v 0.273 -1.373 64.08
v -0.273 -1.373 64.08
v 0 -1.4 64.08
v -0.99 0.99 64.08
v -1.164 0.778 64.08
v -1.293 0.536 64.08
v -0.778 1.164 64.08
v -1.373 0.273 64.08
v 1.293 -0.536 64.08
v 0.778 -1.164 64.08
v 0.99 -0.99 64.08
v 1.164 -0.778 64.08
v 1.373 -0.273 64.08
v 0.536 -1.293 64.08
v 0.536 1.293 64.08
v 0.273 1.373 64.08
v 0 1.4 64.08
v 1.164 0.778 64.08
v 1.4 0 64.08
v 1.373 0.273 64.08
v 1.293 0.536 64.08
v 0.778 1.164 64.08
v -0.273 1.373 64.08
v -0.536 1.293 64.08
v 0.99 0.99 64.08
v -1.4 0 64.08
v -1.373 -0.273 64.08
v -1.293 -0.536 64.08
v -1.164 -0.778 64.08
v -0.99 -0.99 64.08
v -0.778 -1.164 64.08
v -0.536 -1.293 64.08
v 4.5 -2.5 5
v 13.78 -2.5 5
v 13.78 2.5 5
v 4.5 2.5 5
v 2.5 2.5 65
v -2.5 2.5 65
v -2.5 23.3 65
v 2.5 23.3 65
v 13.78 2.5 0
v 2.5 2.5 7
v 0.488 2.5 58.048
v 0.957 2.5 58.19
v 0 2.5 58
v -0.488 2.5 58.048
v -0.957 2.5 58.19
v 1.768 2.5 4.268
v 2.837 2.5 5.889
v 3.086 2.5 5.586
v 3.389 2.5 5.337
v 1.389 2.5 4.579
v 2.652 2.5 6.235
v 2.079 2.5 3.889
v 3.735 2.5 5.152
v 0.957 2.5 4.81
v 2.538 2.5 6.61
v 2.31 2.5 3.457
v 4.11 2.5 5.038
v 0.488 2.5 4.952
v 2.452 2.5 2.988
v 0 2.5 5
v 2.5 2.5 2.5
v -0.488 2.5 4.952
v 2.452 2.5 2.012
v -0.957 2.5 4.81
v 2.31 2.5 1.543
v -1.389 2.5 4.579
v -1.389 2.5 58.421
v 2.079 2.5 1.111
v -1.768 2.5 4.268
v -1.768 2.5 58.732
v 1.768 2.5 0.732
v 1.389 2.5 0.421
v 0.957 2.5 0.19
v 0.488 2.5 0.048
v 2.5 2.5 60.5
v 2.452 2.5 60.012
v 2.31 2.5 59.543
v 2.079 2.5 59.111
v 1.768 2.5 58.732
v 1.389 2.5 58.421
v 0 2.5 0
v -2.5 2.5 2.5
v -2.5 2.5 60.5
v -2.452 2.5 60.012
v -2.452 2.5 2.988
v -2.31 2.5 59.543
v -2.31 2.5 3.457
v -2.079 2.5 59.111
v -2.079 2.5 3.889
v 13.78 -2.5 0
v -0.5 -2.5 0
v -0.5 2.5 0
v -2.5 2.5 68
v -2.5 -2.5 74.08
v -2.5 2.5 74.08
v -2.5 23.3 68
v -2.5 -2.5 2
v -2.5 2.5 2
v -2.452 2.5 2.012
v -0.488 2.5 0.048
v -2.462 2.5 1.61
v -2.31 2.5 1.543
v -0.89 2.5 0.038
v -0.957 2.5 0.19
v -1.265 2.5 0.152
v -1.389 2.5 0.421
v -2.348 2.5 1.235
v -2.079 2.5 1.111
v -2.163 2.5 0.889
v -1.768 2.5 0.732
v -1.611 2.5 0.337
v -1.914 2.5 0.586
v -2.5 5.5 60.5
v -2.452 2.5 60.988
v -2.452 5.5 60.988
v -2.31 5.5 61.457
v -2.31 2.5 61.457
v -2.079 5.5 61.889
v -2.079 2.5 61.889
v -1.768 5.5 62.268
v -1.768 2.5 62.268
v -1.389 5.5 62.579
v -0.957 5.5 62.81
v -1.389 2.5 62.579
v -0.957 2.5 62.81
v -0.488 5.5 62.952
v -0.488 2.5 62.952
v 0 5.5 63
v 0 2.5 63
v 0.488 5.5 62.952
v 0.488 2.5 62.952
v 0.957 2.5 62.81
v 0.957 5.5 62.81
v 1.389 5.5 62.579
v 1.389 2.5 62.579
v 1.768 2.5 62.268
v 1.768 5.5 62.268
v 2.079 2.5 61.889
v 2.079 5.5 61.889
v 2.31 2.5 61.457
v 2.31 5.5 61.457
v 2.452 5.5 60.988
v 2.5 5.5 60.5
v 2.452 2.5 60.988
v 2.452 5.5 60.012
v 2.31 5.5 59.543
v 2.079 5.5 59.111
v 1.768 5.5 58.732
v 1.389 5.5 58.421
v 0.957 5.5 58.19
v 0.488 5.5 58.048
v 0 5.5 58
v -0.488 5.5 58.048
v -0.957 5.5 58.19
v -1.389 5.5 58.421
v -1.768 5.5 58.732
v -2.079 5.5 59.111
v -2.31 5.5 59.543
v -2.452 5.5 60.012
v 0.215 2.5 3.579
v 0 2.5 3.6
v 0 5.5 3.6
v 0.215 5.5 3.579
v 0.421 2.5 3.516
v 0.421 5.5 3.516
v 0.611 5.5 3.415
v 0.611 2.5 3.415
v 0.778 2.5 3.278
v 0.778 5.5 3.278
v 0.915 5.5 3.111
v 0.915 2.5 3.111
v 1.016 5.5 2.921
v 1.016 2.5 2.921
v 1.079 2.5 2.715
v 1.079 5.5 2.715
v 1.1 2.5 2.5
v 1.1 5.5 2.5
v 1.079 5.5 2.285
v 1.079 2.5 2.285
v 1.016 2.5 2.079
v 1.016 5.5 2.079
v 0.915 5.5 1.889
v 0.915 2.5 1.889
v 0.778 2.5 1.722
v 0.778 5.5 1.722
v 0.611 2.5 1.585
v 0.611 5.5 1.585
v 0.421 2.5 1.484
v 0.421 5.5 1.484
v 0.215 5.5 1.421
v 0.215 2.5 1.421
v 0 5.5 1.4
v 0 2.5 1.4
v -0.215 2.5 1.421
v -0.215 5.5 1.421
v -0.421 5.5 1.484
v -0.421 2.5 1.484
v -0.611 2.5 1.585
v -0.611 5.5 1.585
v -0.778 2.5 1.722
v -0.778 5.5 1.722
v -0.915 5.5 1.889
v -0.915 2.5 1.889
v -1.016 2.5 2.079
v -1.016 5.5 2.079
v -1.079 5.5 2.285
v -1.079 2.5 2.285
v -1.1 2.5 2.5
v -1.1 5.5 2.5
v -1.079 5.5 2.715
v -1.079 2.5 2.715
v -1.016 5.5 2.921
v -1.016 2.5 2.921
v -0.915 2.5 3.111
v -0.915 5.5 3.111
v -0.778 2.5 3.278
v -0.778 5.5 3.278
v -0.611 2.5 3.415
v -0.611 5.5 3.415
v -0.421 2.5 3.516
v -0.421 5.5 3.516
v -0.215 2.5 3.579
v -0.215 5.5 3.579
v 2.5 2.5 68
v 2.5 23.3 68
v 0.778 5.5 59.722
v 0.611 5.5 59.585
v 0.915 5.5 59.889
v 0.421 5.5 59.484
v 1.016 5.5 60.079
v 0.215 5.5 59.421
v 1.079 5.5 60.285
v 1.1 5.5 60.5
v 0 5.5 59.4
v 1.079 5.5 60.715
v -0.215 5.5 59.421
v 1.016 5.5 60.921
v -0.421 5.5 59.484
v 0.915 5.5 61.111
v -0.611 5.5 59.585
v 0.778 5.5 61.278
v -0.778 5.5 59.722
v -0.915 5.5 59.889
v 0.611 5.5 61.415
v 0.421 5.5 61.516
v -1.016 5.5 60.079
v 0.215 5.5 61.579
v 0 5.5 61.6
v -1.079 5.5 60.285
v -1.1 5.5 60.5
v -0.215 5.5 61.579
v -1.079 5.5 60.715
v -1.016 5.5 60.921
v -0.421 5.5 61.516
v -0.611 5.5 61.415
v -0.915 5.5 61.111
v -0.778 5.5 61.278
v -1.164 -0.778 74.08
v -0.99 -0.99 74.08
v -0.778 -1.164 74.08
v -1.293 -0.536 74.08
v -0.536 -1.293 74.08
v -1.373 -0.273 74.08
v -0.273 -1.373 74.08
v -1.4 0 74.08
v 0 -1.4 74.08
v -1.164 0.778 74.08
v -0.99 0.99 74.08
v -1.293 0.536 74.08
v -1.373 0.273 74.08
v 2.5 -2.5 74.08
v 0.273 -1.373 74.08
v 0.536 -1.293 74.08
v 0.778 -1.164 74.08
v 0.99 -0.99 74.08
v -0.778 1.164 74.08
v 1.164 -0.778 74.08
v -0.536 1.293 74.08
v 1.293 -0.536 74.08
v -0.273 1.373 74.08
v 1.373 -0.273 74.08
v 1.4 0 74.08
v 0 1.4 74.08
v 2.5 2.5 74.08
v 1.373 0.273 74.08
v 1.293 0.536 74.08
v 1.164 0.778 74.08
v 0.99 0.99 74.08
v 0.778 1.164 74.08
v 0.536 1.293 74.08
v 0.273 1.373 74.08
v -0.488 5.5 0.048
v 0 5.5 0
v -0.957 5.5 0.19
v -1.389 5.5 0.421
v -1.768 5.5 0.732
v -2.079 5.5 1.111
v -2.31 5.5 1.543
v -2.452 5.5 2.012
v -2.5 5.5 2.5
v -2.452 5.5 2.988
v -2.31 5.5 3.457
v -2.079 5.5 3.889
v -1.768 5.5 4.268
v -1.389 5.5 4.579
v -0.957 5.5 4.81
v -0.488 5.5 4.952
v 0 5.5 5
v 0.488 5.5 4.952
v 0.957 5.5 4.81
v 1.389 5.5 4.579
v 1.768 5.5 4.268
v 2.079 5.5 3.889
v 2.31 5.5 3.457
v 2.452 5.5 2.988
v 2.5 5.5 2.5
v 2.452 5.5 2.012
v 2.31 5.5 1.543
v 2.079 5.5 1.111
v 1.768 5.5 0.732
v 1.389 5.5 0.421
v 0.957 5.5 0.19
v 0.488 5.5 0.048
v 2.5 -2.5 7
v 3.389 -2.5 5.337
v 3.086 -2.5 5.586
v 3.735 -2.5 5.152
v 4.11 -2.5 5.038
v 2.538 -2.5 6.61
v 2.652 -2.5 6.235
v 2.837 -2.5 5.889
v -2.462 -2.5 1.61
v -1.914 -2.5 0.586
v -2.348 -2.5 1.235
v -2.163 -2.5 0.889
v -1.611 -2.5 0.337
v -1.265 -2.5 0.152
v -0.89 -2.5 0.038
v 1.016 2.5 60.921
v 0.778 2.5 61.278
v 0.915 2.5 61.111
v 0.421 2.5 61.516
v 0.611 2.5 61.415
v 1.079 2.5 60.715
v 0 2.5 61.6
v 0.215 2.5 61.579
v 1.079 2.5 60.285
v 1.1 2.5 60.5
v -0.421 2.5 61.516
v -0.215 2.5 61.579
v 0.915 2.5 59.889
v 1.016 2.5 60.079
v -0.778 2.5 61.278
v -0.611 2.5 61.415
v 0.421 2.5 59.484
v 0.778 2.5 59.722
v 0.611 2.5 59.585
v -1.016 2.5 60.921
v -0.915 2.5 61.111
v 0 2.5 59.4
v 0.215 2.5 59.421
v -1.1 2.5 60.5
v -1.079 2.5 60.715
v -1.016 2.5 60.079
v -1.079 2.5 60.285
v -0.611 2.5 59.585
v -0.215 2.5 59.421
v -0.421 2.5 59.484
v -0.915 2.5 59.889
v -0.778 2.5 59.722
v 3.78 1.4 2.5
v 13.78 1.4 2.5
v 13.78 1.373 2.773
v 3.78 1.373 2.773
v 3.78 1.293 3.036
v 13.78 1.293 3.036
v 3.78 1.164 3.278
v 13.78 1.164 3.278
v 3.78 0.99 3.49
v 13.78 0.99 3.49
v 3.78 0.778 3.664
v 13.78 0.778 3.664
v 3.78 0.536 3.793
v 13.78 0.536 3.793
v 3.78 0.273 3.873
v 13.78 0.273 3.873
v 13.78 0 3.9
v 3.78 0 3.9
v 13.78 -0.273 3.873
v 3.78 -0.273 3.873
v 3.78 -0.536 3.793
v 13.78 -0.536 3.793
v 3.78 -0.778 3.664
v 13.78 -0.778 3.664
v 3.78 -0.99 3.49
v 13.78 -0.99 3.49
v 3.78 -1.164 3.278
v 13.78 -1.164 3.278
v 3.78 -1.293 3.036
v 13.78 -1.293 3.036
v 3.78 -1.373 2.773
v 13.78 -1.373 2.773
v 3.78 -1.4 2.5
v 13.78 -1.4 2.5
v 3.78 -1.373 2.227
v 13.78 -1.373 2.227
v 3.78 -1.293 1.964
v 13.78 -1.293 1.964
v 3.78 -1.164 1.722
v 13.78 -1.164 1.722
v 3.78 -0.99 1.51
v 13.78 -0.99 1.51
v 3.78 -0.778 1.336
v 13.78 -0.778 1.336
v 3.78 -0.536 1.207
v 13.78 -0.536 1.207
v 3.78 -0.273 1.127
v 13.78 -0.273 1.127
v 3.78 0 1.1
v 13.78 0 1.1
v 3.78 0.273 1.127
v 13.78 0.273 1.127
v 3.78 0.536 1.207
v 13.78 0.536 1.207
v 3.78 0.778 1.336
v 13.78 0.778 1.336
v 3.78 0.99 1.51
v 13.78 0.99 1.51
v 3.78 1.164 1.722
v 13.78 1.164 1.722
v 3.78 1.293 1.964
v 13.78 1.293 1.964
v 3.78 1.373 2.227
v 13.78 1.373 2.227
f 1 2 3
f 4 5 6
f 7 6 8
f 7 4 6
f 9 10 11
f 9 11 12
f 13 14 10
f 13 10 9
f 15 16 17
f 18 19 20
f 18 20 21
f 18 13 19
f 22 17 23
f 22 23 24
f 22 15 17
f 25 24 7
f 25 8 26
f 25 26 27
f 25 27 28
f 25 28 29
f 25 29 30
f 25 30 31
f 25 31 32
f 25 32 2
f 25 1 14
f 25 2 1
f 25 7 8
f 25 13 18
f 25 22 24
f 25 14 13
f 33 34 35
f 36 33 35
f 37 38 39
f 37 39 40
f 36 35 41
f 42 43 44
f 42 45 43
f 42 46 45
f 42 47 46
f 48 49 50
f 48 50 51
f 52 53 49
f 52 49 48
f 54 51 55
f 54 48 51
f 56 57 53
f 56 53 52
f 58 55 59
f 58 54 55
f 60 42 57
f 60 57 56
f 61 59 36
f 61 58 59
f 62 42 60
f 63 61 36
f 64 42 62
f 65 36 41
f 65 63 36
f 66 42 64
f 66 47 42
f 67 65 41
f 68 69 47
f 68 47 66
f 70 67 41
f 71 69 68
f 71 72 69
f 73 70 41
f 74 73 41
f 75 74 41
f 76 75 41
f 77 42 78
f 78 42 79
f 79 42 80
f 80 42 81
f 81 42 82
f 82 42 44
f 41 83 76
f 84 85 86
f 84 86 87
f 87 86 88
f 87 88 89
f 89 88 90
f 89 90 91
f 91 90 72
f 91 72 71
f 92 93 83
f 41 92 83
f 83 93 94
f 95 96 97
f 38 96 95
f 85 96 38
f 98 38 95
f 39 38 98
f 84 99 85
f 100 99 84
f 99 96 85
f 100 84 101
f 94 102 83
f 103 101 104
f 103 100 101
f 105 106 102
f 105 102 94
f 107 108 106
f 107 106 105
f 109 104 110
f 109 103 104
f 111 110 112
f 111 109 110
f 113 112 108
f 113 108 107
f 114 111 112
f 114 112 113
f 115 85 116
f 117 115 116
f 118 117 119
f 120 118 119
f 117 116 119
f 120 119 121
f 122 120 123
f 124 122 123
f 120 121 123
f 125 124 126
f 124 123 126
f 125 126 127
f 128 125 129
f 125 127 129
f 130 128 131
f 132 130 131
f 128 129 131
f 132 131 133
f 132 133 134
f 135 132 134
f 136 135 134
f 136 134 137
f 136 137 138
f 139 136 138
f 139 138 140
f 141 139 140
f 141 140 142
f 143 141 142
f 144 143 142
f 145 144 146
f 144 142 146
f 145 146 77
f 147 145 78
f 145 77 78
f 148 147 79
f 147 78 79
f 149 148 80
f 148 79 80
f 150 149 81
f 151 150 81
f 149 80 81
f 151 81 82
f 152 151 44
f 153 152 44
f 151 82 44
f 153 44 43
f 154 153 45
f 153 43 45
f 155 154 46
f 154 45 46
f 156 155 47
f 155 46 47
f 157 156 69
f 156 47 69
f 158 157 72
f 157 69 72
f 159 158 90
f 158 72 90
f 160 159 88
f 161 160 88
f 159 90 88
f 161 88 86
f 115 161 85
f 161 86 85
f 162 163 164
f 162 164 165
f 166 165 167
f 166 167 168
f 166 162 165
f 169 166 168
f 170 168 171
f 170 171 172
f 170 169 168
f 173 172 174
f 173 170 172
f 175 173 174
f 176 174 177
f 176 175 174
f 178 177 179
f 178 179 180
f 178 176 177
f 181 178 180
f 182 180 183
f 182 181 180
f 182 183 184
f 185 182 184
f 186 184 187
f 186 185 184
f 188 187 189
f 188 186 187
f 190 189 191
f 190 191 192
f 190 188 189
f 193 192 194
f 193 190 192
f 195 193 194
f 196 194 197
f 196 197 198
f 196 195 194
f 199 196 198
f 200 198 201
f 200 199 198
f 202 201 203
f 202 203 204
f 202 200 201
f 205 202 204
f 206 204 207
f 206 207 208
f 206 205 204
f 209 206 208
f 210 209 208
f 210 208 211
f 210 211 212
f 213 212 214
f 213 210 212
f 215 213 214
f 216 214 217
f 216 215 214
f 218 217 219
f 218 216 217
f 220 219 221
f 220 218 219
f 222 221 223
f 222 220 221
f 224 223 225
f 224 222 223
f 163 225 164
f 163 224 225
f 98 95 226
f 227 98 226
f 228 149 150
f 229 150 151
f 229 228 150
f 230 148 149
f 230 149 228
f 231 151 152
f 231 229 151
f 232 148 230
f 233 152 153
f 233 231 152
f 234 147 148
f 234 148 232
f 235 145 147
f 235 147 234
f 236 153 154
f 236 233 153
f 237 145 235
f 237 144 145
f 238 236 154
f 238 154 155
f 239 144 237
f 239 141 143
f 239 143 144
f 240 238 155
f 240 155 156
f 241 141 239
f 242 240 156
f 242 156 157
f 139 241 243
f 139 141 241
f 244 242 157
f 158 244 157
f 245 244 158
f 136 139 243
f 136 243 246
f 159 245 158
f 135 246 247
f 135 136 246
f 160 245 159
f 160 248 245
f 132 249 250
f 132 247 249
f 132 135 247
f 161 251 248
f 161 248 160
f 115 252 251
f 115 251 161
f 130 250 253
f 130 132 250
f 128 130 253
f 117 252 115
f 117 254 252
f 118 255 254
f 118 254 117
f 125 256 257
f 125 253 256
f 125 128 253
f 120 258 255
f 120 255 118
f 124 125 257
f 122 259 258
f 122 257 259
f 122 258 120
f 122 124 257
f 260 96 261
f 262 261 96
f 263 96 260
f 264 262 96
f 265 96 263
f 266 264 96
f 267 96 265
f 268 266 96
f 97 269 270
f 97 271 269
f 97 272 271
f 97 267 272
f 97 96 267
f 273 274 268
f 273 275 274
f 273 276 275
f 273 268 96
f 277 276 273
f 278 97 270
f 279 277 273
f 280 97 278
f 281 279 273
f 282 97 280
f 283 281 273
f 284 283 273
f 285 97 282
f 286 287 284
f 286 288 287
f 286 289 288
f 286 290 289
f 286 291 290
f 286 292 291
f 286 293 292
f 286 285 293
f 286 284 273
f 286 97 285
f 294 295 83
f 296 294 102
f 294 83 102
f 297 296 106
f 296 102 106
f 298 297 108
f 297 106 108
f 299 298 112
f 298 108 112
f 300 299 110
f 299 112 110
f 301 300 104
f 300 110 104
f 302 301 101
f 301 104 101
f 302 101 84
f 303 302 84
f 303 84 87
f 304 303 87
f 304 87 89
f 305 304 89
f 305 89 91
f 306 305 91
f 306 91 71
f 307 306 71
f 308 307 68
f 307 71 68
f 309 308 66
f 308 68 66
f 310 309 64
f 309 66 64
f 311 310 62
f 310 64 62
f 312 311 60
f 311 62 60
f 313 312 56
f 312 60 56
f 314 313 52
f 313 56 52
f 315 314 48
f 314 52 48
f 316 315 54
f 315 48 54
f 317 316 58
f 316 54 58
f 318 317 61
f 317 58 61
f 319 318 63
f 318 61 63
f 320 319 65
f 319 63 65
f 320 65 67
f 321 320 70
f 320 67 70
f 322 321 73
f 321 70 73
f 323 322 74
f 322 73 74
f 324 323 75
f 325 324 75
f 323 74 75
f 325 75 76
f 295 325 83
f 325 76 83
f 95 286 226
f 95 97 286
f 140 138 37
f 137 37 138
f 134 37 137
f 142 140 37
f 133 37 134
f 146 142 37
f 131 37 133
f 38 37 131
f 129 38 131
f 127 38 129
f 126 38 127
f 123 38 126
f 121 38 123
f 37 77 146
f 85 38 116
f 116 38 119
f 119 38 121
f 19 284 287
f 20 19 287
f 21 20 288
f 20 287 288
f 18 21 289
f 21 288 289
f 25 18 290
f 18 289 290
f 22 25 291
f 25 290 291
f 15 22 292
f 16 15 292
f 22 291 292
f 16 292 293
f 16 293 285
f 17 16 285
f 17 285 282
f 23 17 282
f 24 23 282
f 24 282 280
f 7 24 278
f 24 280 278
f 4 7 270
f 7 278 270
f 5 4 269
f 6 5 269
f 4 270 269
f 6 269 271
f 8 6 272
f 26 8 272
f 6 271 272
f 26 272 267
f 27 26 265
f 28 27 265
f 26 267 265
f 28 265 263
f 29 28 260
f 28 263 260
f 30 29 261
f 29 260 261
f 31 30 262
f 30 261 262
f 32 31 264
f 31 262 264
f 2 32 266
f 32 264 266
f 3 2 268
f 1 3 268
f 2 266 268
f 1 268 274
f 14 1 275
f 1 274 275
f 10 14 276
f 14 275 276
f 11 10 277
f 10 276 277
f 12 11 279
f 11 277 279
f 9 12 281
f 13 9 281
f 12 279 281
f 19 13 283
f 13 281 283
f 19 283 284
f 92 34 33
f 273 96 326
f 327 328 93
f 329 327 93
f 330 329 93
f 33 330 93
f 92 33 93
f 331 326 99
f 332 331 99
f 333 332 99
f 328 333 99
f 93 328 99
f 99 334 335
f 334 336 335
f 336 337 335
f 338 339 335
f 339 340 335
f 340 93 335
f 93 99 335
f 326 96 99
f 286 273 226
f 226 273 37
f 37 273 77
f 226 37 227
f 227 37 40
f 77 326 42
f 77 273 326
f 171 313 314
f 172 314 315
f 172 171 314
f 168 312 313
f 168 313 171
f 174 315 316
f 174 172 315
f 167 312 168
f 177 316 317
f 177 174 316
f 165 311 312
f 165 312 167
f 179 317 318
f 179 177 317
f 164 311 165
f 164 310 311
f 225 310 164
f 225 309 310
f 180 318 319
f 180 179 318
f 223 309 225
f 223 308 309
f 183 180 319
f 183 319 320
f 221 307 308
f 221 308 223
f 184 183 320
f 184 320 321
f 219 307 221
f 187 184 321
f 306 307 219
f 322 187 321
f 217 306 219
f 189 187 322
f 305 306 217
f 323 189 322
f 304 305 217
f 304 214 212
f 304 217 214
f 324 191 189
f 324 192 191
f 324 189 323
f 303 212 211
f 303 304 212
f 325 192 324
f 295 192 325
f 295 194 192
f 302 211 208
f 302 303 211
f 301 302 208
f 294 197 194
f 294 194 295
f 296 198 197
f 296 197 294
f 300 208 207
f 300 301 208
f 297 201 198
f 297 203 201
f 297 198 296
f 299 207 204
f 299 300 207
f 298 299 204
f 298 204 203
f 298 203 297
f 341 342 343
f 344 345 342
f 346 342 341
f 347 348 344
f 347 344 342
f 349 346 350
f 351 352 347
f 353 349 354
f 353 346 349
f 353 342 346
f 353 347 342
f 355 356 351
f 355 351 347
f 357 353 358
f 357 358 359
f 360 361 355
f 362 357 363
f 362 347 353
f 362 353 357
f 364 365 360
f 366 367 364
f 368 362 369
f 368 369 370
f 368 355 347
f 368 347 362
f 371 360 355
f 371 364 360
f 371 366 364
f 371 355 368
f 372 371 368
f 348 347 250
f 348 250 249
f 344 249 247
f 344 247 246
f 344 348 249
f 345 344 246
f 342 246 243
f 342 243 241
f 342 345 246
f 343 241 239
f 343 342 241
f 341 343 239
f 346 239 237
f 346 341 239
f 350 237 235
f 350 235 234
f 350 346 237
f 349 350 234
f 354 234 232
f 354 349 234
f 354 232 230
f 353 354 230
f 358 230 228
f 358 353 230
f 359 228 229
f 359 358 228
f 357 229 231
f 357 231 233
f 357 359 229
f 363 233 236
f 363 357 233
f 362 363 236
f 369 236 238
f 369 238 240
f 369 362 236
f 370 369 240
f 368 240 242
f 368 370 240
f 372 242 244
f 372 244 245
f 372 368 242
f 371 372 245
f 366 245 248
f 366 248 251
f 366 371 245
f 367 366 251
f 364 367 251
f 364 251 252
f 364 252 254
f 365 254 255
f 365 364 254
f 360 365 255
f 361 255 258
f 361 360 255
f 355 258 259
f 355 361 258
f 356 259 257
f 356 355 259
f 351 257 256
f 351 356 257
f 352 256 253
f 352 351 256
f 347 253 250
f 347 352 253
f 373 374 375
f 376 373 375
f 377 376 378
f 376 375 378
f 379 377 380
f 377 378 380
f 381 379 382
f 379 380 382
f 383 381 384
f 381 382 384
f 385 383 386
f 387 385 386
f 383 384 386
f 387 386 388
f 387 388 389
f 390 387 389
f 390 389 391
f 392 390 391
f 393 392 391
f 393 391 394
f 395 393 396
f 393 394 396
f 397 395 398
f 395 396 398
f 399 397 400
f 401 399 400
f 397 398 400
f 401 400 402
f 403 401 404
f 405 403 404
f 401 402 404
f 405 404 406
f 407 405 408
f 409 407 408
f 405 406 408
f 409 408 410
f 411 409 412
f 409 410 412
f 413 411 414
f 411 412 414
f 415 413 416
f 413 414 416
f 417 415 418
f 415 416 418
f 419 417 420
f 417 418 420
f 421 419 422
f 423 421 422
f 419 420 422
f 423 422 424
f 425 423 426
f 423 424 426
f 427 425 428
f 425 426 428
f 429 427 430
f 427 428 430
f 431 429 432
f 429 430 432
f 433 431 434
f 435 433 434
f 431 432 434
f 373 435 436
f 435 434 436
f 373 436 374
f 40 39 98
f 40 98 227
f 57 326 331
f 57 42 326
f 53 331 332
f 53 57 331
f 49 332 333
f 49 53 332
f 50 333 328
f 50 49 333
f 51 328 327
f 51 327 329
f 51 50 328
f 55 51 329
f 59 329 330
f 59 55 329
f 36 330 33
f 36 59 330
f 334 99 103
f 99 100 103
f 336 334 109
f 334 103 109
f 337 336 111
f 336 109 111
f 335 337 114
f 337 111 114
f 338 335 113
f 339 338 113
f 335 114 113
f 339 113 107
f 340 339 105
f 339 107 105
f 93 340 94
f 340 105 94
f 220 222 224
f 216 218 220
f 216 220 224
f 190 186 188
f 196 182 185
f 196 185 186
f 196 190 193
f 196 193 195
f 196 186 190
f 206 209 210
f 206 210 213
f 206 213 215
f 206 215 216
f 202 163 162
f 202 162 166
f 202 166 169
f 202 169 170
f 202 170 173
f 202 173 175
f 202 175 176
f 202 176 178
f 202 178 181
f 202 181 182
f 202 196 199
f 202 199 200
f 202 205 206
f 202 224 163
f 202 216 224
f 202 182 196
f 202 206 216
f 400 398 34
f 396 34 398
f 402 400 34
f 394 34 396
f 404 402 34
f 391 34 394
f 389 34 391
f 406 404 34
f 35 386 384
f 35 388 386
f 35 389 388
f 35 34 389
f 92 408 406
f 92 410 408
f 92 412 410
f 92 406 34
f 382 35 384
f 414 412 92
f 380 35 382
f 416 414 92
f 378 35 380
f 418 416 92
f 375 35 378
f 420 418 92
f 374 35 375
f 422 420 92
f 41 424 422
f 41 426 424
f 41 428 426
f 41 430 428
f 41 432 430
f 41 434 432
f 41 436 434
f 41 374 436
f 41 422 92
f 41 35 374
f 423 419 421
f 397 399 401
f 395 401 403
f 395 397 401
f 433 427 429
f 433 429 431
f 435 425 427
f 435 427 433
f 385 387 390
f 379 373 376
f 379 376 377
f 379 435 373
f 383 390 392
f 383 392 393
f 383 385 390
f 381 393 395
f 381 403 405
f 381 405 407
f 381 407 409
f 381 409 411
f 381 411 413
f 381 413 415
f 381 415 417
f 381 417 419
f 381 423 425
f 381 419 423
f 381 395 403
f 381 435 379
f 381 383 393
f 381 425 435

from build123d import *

# Parameters (mm, degrees)
SKETCH1_W           = 5
SKETCH1_H           = 5
BOSS_EXTRUDE1_DEPTH = 74.08
SKETCH2_R           = 1.4
CUT_EXTRUDE1_DEPTH  = 10
SKETCH3_W           = 5
SKETCH3_H           = 5
BOSS_EXTRUDE2_DEPTH = 11.28
SKETCH4_R           = 1.4
CUT_EXTRUDE2_DEPTH  = 10
SKETCH5_R           = 2.5
SKETCH5_R_2         = 1.1
BOSS_EXTRUDE3_DEPTH = 3
FILLET1_R           = 2
SKETCH7_W           = 5
SKETCH7_H           = 3
BOSS_EXTRUDE4_DEPTH = 20.8


with BuildPart() as part:
    # Sketch1 → Boss-Extrude1 (new body)
    with BuildSketch(Plane.XY):
        Rectangle(SKETCH1_W, SKETCH1_H)
    extrude(amount=BOSS_EXTRUDE1_DEPTH)

    # Sketch2 → Cut-Extrude1 (cut)
    with BuildSketch(Plane.XY.offset(74.08)):
        Circle(SKETCH2_R)
    extrude(amount=-CUT_EXTRUDE1_DEPTH, mode=Mode.SUBTRACT)

    # Sketch3 → Boss-Extrude2 (add)
    with BuildSketch(Plane(origin=(2.5, 0, 0), x_dir=(0, 0, -1), z_dir=(1, 0, 0))):
        with Locations((-2.5, 0)):
            Rectangle(SKETCH3_W, SKETCH3_H)
    extrude(amount=BOSS_EXTRUDE2_DEPTH)

    # Sketch4 → Cut-Extrude2 (cut)
    with BuildSketch(Plane(origin=(13.78, 0, 0), x_dir=(0, 0, -1), z_dir=(1, 0, 0))):
        with Locations(Location((-2.5, 0, 0), (0, 0, 90))):
            Circle(SKETCH4_R)
    extrude(amount=-CUT_EXTRUDE2_DEPTH, mode=Mode.SUBTRACT)

    # Sketch5 → Boss-Extrude3 (add)
    # profile 1 of 2: a face of its own
    with BuildSketch(Plane(origin=(0, 2.5, 0), x_dir=(1, 0, 0), z_dir=(0, 1, 0))):
        with Locations(Location((0, -60.5, 0), (0, 0, 180))):
            Circle(SKETCH5_R)
        with Locations(Location((0, -60.5, 0), (0, 0, 270))):
            Circle(SKETCH5_R_2, mode=Mode.SUBTRACT)
    # profile 2 of 2: a face of its own
    with BuildSketch(Plane(origin=(0, 2.5, 0), x_dir=(1, 0, 0), z_dir=(0, 1, 0))):
        with Locations(Location((0, -2.5, 0), (0, 0, 90))):
            Circle(SKETCH5_R)
        with Locations(Location((0, -2.5, 0), (0, 0, 270))):
            Circle(SKETCH5_R_2, mode=Mode.SUBTRACT)
    extrude(amount=BOSS_EXTRUDE3_DEPTH)

    # Fillet1
    fillet1_edges = [part.edges().sort_by_distance(p)[0] for p in [
        (2.5, 0, 5),
        (-2.5, 0, 0),
    ]]
    fillet(fillet1_edges, radius=FILLET1_R)

    # Sketch7 → Boss-Extrude4 (add)
    with BuildSketch(Plane(origin=(0, 2.5, 0), x_dir=(1, 0, 0), z_dir=(0, 1, 0))):
        with Locations((0, -66.5)):
            Rectangle(SKETCH7_W, SKETCH7_H)
    extrude(amount=BOSS_EXTRUDE4_DEPTH)


solid = part.part
